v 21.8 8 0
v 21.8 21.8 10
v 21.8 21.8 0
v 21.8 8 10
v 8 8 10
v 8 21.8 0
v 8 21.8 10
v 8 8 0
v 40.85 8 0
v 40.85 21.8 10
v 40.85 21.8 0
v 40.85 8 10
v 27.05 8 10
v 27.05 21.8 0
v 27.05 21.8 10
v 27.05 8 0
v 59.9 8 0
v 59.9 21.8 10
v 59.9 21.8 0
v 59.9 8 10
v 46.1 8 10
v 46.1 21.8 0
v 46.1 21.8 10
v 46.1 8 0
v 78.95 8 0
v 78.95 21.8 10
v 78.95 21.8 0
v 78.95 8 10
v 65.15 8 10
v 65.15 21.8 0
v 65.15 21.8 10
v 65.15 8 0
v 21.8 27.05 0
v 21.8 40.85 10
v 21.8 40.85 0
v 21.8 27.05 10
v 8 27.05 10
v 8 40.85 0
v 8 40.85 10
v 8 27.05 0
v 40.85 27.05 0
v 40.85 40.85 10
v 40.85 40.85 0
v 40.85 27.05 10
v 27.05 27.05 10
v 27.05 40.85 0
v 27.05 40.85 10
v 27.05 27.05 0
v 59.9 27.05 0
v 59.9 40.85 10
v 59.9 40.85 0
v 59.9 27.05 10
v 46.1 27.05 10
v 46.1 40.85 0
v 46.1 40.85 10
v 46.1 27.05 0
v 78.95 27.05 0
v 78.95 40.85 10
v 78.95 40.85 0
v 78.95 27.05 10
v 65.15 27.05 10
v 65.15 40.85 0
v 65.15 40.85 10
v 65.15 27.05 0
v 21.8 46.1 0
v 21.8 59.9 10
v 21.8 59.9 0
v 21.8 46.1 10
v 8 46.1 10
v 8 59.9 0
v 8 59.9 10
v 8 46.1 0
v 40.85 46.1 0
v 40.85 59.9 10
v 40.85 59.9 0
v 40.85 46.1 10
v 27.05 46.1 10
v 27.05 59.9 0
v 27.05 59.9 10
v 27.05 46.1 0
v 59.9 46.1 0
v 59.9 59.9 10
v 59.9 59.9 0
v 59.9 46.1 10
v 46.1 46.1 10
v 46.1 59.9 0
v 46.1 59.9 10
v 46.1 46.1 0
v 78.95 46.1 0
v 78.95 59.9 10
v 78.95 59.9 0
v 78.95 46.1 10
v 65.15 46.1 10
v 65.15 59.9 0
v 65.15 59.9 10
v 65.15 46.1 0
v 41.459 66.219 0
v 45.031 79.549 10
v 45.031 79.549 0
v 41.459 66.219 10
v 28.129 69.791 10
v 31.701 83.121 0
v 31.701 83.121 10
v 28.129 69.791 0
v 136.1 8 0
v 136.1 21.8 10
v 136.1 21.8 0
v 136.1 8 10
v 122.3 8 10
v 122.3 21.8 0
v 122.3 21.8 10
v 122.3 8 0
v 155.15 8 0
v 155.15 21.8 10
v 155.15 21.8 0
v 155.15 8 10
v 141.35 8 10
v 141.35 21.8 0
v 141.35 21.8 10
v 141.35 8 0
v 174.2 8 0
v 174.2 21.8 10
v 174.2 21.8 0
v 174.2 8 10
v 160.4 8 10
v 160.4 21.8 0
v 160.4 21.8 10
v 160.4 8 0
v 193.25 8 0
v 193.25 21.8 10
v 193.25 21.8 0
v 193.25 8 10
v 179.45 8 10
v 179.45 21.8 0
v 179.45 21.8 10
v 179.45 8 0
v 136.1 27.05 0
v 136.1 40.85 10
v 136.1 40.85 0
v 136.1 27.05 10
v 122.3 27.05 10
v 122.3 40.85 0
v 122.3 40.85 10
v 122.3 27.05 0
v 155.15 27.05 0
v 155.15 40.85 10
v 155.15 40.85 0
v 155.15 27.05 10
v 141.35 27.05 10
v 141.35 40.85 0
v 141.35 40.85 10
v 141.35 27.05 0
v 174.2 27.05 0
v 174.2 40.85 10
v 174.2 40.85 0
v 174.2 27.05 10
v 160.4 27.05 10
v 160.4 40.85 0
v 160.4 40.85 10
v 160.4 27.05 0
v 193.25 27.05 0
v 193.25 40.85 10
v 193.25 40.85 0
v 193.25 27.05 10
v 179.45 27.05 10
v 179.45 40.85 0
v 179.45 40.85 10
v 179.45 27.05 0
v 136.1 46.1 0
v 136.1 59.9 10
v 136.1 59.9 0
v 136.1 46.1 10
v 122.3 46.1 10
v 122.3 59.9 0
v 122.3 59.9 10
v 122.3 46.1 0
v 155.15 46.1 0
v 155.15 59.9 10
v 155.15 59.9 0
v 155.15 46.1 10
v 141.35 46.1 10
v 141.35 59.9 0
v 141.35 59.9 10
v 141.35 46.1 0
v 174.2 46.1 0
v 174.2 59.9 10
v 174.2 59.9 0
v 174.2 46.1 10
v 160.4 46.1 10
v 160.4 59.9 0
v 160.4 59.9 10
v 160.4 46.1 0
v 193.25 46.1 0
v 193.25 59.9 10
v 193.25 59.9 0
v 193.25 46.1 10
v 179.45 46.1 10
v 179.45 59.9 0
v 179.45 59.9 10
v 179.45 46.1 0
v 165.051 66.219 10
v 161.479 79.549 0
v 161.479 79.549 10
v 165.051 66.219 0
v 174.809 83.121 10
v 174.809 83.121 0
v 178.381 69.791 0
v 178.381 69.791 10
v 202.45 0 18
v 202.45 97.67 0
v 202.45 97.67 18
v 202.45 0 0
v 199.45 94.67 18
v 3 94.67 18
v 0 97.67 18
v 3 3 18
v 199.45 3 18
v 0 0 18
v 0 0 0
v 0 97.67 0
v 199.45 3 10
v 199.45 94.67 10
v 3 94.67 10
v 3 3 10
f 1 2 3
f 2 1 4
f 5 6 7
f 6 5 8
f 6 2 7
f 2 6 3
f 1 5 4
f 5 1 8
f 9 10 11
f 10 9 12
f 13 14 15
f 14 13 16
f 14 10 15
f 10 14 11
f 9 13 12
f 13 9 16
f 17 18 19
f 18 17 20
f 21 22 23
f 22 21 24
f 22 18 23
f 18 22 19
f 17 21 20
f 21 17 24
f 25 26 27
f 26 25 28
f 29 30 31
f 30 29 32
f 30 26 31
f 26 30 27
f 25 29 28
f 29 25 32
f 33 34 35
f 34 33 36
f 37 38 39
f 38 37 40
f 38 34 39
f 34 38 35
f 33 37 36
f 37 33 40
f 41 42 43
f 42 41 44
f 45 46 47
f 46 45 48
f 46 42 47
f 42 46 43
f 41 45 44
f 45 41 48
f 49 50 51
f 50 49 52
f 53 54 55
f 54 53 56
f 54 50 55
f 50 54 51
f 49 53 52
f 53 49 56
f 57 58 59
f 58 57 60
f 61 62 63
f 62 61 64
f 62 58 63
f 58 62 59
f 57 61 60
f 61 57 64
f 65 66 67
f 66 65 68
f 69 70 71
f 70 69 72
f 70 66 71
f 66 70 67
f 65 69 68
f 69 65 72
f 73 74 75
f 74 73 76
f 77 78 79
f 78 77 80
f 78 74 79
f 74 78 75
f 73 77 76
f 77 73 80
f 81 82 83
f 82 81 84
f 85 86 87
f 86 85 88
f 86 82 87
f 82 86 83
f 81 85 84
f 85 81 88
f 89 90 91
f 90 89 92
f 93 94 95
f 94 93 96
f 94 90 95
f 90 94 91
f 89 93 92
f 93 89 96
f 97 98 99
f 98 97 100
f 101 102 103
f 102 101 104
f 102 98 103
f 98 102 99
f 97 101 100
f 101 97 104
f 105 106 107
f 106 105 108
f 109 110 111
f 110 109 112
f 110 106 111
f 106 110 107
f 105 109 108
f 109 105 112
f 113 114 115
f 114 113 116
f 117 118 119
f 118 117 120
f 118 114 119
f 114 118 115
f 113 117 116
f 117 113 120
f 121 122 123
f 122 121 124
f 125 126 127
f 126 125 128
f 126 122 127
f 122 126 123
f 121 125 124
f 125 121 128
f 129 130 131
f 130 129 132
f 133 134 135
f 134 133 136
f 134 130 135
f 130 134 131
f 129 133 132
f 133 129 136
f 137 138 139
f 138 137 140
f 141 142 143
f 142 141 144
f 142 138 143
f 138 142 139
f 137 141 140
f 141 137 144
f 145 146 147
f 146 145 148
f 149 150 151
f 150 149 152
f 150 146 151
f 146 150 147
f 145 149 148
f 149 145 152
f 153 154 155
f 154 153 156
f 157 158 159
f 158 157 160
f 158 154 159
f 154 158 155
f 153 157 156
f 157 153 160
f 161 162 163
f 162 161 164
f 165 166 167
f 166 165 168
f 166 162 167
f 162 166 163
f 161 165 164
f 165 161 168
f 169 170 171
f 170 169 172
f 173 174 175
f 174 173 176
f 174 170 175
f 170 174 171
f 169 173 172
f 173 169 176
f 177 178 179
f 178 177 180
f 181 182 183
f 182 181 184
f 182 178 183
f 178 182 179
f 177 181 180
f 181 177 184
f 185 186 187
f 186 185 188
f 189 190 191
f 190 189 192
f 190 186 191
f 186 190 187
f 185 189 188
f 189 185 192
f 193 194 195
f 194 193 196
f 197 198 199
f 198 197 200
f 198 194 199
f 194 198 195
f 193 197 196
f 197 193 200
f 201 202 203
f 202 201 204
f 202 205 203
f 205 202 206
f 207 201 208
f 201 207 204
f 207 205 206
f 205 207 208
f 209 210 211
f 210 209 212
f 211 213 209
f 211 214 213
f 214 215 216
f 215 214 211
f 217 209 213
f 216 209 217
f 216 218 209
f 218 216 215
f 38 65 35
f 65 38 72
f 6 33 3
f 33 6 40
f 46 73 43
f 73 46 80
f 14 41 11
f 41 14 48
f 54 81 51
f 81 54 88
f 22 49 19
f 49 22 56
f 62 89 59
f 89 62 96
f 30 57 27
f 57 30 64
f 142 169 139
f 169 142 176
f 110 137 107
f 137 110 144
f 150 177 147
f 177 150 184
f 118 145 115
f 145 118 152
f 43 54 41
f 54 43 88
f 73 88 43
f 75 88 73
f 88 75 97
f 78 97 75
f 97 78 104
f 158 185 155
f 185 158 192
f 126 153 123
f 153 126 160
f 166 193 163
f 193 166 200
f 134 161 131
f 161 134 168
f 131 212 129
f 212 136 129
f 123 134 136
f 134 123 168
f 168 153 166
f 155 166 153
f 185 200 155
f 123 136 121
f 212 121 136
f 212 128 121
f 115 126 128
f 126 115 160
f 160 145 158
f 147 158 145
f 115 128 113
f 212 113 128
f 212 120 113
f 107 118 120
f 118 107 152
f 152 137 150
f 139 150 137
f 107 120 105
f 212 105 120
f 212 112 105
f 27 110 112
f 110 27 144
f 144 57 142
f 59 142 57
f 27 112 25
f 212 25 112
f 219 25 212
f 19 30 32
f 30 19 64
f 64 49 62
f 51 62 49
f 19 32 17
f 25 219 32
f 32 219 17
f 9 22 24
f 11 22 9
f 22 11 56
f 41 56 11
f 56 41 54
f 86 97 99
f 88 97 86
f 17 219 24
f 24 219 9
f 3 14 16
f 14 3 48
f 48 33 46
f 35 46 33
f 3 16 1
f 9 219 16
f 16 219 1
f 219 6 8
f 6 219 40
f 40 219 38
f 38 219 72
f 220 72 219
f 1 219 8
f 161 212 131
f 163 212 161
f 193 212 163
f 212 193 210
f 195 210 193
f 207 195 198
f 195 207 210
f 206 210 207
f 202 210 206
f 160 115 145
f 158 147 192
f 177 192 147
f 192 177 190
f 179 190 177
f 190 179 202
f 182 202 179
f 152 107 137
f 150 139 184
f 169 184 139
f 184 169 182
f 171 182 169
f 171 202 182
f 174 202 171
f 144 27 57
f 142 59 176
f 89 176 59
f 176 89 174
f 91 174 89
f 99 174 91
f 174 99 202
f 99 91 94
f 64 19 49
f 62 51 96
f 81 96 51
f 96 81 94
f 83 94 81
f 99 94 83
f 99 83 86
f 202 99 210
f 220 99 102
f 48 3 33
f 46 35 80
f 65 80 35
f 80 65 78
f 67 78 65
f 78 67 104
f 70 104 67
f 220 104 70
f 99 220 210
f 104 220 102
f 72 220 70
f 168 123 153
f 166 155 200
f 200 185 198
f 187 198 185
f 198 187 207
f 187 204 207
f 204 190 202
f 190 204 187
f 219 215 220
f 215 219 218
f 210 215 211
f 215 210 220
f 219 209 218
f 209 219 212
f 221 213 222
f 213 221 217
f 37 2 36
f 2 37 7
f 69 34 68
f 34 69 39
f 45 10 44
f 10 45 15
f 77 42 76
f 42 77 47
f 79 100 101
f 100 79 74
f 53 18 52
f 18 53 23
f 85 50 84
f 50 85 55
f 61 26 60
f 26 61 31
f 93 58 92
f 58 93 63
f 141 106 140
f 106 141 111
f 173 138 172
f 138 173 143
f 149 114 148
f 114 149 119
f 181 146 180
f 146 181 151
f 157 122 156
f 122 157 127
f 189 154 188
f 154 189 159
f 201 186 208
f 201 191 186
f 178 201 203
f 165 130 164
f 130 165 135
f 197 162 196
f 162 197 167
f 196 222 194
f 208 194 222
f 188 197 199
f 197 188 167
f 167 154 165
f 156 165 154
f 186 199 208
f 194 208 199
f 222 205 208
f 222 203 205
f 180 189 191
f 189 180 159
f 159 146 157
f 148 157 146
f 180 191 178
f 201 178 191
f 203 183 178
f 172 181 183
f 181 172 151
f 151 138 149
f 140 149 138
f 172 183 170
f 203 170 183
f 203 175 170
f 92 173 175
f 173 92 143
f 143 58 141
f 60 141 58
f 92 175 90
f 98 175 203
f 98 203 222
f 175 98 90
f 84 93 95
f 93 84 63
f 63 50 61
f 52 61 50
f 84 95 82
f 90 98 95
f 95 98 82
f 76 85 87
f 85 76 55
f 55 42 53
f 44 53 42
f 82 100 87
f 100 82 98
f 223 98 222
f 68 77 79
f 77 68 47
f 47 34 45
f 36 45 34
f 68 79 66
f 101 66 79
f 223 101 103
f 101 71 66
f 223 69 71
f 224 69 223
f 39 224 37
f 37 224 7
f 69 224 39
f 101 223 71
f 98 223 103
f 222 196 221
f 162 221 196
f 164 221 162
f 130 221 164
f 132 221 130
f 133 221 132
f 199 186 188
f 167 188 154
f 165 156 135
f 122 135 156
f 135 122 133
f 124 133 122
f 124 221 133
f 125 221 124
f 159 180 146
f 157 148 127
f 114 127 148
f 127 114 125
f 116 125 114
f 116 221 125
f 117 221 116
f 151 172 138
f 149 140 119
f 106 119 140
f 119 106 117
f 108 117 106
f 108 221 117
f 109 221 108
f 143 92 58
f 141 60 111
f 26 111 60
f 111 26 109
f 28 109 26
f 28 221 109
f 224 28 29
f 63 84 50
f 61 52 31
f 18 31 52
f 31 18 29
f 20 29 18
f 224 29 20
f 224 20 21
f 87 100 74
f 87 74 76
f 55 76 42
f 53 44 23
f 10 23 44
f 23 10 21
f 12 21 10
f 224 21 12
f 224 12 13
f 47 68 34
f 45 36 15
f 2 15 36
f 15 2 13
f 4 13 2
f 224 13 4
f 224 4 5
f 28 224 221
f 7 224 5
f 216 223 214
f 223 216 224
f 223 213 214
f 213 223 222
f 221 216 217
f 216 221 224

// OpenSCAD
// Generated keyboard case
// Layout: Custom (26 keys)
// Switch type: Kailh Choc

// Parameters
case_width = 202.45;
case_height = 97.67;
case_depth = 18.00;
wall_thickness = 3.00;
base_height = 10.00;
switch_cutout_size = 13.80;
key_spacing = 19.05;

module keyboard_case() {
    difference() {
        // Outer shell
        translate([0, 0, 0])
            cube([case_width, case_height, case_depth]);

        // Inner cavity
        translate([wall_thickness, wall_thickness, base_height])
            cube([case_width - 2*wall_thickness, 
                  case_height - 2*wall_thickness, 
                  case_depth - base_height + 1]);

        // Switch cutouts
        translate([wall_thickness + 5 - 0.00, wall_thickness + 5 - 0.00, -1])
            switch_plate();
    }
}

module switch_plate() {
    translate([0.00, 0.00, 0])
        cube([switch_cutout_size, switch_cutout_size, base_height + 2]);
    translate([19.05, 0.00, 0])
        cube([switch_cutout_size, switch_cutout_size, base_height + 2]);
    translate([38.10, 0.00, 0])
        cube([switch_cutout_size, switch_cutout_size, base_height + 2]);
    translate([57.15, 0.00, 0])
        cube([switch_cutout_size, switch_cutout_size, base_height + 2]);
    translate([0.00, 19.05, 0])
        cube([switch_cutout_size, switch_cutout_size, base_height + 2]);
    translate([19.05, 19.05, 0])
        cube([switch_cutout_size, switch_cutout_size, base_height + 2]);
    translate([38.10, 19.05, 0])
        cube([switch_cutout_size, switch_cutout_size, base_height + 2]);
    translate([57.15, 19.05, 0])
        cube([switch_cutout_size, switch_cutout_size, base_height + 2]);
    translate([0.00, 38.10, 0])
        cube([switch_cutout_size, switch_cutout_size, base_height + 2]);
    translate([19.05, 38.10, 0])
        cube([switch_cutout_size, switch_cutout_size, base_height + 2]);
    translate([38.10, 38.10, 0])
        cube([switch_cutout_size, switch_cutout_size, base_height + 2]);
    translate([57.15, 38.10, 0])
        cube([switch_cutout_size, switch_cutout_size, base_height + 2]);
    translate([28.58, 66.67, 0])
        rotate([0, 0, -15.00])
            translate([-6.90, -6.90, 0])
                cube([switch_cutout_size, switch_cutout_size, base_height + 2]);
    translate([114.30, 0.00, 0])
        cube([switch_cutout_size, switch_cutout_size, base_height + 2]);
    translate([133.35, 0.00, 0])
        cube([switch_cutout_size, switch_cutout_size, base_height + 2]);
    translate([152.40, 0.00, 0])
        cube([switch_cutout_size, switch_cutout_size, base_height + 2]);
    translate([171.45, 0.00, 0])
        cube([switch_cutout_size, switch_cutout_size, base_height + 2]);
    translate([114.30, 19.05, 0])
        cube([switch_cutout_size, switch_cutout_size, base_height + 2]);
    translate([133.35, 19.05, 0])
        cube([switch_cutout_size, switch_cutout_size, base_height + 2]);
    translate([152.40, 19.05, 0])
        cube([switch_cutout_size, switch_cutout_size, base_height + 2]);
    translate([171.45, 19.05, 0])
        cube([switch_cutout_size, switch_cutout_size, base_height + 2]);
    translate([114.30, 38.10, 0])
        cube([switch_cutout_size, switch_cutout_size, base_height + 2]);
    translate([133.35, 38.10, 0])
        cube([switch_cutout_size, switch_cutout_size, base_height + 2]);
    translate([152.40, 38.10, 0])
        cube([switch_cutout_size, switch_cutout_size, base_height + 2]);
    translate([171.45, 38.10, 0])
        cube([switch_cutout_size, switch_cutout_size, base_height + 2]);
    translate([161.93, 66.67, 0])
        rotate([0, 0, 15.00])
            translate([-6.90, -6.90, 0])
                cube([switch_cutout_size, switch_cutout_size, base_height + 2]);
}

// Generate the case
keyboard_case();
